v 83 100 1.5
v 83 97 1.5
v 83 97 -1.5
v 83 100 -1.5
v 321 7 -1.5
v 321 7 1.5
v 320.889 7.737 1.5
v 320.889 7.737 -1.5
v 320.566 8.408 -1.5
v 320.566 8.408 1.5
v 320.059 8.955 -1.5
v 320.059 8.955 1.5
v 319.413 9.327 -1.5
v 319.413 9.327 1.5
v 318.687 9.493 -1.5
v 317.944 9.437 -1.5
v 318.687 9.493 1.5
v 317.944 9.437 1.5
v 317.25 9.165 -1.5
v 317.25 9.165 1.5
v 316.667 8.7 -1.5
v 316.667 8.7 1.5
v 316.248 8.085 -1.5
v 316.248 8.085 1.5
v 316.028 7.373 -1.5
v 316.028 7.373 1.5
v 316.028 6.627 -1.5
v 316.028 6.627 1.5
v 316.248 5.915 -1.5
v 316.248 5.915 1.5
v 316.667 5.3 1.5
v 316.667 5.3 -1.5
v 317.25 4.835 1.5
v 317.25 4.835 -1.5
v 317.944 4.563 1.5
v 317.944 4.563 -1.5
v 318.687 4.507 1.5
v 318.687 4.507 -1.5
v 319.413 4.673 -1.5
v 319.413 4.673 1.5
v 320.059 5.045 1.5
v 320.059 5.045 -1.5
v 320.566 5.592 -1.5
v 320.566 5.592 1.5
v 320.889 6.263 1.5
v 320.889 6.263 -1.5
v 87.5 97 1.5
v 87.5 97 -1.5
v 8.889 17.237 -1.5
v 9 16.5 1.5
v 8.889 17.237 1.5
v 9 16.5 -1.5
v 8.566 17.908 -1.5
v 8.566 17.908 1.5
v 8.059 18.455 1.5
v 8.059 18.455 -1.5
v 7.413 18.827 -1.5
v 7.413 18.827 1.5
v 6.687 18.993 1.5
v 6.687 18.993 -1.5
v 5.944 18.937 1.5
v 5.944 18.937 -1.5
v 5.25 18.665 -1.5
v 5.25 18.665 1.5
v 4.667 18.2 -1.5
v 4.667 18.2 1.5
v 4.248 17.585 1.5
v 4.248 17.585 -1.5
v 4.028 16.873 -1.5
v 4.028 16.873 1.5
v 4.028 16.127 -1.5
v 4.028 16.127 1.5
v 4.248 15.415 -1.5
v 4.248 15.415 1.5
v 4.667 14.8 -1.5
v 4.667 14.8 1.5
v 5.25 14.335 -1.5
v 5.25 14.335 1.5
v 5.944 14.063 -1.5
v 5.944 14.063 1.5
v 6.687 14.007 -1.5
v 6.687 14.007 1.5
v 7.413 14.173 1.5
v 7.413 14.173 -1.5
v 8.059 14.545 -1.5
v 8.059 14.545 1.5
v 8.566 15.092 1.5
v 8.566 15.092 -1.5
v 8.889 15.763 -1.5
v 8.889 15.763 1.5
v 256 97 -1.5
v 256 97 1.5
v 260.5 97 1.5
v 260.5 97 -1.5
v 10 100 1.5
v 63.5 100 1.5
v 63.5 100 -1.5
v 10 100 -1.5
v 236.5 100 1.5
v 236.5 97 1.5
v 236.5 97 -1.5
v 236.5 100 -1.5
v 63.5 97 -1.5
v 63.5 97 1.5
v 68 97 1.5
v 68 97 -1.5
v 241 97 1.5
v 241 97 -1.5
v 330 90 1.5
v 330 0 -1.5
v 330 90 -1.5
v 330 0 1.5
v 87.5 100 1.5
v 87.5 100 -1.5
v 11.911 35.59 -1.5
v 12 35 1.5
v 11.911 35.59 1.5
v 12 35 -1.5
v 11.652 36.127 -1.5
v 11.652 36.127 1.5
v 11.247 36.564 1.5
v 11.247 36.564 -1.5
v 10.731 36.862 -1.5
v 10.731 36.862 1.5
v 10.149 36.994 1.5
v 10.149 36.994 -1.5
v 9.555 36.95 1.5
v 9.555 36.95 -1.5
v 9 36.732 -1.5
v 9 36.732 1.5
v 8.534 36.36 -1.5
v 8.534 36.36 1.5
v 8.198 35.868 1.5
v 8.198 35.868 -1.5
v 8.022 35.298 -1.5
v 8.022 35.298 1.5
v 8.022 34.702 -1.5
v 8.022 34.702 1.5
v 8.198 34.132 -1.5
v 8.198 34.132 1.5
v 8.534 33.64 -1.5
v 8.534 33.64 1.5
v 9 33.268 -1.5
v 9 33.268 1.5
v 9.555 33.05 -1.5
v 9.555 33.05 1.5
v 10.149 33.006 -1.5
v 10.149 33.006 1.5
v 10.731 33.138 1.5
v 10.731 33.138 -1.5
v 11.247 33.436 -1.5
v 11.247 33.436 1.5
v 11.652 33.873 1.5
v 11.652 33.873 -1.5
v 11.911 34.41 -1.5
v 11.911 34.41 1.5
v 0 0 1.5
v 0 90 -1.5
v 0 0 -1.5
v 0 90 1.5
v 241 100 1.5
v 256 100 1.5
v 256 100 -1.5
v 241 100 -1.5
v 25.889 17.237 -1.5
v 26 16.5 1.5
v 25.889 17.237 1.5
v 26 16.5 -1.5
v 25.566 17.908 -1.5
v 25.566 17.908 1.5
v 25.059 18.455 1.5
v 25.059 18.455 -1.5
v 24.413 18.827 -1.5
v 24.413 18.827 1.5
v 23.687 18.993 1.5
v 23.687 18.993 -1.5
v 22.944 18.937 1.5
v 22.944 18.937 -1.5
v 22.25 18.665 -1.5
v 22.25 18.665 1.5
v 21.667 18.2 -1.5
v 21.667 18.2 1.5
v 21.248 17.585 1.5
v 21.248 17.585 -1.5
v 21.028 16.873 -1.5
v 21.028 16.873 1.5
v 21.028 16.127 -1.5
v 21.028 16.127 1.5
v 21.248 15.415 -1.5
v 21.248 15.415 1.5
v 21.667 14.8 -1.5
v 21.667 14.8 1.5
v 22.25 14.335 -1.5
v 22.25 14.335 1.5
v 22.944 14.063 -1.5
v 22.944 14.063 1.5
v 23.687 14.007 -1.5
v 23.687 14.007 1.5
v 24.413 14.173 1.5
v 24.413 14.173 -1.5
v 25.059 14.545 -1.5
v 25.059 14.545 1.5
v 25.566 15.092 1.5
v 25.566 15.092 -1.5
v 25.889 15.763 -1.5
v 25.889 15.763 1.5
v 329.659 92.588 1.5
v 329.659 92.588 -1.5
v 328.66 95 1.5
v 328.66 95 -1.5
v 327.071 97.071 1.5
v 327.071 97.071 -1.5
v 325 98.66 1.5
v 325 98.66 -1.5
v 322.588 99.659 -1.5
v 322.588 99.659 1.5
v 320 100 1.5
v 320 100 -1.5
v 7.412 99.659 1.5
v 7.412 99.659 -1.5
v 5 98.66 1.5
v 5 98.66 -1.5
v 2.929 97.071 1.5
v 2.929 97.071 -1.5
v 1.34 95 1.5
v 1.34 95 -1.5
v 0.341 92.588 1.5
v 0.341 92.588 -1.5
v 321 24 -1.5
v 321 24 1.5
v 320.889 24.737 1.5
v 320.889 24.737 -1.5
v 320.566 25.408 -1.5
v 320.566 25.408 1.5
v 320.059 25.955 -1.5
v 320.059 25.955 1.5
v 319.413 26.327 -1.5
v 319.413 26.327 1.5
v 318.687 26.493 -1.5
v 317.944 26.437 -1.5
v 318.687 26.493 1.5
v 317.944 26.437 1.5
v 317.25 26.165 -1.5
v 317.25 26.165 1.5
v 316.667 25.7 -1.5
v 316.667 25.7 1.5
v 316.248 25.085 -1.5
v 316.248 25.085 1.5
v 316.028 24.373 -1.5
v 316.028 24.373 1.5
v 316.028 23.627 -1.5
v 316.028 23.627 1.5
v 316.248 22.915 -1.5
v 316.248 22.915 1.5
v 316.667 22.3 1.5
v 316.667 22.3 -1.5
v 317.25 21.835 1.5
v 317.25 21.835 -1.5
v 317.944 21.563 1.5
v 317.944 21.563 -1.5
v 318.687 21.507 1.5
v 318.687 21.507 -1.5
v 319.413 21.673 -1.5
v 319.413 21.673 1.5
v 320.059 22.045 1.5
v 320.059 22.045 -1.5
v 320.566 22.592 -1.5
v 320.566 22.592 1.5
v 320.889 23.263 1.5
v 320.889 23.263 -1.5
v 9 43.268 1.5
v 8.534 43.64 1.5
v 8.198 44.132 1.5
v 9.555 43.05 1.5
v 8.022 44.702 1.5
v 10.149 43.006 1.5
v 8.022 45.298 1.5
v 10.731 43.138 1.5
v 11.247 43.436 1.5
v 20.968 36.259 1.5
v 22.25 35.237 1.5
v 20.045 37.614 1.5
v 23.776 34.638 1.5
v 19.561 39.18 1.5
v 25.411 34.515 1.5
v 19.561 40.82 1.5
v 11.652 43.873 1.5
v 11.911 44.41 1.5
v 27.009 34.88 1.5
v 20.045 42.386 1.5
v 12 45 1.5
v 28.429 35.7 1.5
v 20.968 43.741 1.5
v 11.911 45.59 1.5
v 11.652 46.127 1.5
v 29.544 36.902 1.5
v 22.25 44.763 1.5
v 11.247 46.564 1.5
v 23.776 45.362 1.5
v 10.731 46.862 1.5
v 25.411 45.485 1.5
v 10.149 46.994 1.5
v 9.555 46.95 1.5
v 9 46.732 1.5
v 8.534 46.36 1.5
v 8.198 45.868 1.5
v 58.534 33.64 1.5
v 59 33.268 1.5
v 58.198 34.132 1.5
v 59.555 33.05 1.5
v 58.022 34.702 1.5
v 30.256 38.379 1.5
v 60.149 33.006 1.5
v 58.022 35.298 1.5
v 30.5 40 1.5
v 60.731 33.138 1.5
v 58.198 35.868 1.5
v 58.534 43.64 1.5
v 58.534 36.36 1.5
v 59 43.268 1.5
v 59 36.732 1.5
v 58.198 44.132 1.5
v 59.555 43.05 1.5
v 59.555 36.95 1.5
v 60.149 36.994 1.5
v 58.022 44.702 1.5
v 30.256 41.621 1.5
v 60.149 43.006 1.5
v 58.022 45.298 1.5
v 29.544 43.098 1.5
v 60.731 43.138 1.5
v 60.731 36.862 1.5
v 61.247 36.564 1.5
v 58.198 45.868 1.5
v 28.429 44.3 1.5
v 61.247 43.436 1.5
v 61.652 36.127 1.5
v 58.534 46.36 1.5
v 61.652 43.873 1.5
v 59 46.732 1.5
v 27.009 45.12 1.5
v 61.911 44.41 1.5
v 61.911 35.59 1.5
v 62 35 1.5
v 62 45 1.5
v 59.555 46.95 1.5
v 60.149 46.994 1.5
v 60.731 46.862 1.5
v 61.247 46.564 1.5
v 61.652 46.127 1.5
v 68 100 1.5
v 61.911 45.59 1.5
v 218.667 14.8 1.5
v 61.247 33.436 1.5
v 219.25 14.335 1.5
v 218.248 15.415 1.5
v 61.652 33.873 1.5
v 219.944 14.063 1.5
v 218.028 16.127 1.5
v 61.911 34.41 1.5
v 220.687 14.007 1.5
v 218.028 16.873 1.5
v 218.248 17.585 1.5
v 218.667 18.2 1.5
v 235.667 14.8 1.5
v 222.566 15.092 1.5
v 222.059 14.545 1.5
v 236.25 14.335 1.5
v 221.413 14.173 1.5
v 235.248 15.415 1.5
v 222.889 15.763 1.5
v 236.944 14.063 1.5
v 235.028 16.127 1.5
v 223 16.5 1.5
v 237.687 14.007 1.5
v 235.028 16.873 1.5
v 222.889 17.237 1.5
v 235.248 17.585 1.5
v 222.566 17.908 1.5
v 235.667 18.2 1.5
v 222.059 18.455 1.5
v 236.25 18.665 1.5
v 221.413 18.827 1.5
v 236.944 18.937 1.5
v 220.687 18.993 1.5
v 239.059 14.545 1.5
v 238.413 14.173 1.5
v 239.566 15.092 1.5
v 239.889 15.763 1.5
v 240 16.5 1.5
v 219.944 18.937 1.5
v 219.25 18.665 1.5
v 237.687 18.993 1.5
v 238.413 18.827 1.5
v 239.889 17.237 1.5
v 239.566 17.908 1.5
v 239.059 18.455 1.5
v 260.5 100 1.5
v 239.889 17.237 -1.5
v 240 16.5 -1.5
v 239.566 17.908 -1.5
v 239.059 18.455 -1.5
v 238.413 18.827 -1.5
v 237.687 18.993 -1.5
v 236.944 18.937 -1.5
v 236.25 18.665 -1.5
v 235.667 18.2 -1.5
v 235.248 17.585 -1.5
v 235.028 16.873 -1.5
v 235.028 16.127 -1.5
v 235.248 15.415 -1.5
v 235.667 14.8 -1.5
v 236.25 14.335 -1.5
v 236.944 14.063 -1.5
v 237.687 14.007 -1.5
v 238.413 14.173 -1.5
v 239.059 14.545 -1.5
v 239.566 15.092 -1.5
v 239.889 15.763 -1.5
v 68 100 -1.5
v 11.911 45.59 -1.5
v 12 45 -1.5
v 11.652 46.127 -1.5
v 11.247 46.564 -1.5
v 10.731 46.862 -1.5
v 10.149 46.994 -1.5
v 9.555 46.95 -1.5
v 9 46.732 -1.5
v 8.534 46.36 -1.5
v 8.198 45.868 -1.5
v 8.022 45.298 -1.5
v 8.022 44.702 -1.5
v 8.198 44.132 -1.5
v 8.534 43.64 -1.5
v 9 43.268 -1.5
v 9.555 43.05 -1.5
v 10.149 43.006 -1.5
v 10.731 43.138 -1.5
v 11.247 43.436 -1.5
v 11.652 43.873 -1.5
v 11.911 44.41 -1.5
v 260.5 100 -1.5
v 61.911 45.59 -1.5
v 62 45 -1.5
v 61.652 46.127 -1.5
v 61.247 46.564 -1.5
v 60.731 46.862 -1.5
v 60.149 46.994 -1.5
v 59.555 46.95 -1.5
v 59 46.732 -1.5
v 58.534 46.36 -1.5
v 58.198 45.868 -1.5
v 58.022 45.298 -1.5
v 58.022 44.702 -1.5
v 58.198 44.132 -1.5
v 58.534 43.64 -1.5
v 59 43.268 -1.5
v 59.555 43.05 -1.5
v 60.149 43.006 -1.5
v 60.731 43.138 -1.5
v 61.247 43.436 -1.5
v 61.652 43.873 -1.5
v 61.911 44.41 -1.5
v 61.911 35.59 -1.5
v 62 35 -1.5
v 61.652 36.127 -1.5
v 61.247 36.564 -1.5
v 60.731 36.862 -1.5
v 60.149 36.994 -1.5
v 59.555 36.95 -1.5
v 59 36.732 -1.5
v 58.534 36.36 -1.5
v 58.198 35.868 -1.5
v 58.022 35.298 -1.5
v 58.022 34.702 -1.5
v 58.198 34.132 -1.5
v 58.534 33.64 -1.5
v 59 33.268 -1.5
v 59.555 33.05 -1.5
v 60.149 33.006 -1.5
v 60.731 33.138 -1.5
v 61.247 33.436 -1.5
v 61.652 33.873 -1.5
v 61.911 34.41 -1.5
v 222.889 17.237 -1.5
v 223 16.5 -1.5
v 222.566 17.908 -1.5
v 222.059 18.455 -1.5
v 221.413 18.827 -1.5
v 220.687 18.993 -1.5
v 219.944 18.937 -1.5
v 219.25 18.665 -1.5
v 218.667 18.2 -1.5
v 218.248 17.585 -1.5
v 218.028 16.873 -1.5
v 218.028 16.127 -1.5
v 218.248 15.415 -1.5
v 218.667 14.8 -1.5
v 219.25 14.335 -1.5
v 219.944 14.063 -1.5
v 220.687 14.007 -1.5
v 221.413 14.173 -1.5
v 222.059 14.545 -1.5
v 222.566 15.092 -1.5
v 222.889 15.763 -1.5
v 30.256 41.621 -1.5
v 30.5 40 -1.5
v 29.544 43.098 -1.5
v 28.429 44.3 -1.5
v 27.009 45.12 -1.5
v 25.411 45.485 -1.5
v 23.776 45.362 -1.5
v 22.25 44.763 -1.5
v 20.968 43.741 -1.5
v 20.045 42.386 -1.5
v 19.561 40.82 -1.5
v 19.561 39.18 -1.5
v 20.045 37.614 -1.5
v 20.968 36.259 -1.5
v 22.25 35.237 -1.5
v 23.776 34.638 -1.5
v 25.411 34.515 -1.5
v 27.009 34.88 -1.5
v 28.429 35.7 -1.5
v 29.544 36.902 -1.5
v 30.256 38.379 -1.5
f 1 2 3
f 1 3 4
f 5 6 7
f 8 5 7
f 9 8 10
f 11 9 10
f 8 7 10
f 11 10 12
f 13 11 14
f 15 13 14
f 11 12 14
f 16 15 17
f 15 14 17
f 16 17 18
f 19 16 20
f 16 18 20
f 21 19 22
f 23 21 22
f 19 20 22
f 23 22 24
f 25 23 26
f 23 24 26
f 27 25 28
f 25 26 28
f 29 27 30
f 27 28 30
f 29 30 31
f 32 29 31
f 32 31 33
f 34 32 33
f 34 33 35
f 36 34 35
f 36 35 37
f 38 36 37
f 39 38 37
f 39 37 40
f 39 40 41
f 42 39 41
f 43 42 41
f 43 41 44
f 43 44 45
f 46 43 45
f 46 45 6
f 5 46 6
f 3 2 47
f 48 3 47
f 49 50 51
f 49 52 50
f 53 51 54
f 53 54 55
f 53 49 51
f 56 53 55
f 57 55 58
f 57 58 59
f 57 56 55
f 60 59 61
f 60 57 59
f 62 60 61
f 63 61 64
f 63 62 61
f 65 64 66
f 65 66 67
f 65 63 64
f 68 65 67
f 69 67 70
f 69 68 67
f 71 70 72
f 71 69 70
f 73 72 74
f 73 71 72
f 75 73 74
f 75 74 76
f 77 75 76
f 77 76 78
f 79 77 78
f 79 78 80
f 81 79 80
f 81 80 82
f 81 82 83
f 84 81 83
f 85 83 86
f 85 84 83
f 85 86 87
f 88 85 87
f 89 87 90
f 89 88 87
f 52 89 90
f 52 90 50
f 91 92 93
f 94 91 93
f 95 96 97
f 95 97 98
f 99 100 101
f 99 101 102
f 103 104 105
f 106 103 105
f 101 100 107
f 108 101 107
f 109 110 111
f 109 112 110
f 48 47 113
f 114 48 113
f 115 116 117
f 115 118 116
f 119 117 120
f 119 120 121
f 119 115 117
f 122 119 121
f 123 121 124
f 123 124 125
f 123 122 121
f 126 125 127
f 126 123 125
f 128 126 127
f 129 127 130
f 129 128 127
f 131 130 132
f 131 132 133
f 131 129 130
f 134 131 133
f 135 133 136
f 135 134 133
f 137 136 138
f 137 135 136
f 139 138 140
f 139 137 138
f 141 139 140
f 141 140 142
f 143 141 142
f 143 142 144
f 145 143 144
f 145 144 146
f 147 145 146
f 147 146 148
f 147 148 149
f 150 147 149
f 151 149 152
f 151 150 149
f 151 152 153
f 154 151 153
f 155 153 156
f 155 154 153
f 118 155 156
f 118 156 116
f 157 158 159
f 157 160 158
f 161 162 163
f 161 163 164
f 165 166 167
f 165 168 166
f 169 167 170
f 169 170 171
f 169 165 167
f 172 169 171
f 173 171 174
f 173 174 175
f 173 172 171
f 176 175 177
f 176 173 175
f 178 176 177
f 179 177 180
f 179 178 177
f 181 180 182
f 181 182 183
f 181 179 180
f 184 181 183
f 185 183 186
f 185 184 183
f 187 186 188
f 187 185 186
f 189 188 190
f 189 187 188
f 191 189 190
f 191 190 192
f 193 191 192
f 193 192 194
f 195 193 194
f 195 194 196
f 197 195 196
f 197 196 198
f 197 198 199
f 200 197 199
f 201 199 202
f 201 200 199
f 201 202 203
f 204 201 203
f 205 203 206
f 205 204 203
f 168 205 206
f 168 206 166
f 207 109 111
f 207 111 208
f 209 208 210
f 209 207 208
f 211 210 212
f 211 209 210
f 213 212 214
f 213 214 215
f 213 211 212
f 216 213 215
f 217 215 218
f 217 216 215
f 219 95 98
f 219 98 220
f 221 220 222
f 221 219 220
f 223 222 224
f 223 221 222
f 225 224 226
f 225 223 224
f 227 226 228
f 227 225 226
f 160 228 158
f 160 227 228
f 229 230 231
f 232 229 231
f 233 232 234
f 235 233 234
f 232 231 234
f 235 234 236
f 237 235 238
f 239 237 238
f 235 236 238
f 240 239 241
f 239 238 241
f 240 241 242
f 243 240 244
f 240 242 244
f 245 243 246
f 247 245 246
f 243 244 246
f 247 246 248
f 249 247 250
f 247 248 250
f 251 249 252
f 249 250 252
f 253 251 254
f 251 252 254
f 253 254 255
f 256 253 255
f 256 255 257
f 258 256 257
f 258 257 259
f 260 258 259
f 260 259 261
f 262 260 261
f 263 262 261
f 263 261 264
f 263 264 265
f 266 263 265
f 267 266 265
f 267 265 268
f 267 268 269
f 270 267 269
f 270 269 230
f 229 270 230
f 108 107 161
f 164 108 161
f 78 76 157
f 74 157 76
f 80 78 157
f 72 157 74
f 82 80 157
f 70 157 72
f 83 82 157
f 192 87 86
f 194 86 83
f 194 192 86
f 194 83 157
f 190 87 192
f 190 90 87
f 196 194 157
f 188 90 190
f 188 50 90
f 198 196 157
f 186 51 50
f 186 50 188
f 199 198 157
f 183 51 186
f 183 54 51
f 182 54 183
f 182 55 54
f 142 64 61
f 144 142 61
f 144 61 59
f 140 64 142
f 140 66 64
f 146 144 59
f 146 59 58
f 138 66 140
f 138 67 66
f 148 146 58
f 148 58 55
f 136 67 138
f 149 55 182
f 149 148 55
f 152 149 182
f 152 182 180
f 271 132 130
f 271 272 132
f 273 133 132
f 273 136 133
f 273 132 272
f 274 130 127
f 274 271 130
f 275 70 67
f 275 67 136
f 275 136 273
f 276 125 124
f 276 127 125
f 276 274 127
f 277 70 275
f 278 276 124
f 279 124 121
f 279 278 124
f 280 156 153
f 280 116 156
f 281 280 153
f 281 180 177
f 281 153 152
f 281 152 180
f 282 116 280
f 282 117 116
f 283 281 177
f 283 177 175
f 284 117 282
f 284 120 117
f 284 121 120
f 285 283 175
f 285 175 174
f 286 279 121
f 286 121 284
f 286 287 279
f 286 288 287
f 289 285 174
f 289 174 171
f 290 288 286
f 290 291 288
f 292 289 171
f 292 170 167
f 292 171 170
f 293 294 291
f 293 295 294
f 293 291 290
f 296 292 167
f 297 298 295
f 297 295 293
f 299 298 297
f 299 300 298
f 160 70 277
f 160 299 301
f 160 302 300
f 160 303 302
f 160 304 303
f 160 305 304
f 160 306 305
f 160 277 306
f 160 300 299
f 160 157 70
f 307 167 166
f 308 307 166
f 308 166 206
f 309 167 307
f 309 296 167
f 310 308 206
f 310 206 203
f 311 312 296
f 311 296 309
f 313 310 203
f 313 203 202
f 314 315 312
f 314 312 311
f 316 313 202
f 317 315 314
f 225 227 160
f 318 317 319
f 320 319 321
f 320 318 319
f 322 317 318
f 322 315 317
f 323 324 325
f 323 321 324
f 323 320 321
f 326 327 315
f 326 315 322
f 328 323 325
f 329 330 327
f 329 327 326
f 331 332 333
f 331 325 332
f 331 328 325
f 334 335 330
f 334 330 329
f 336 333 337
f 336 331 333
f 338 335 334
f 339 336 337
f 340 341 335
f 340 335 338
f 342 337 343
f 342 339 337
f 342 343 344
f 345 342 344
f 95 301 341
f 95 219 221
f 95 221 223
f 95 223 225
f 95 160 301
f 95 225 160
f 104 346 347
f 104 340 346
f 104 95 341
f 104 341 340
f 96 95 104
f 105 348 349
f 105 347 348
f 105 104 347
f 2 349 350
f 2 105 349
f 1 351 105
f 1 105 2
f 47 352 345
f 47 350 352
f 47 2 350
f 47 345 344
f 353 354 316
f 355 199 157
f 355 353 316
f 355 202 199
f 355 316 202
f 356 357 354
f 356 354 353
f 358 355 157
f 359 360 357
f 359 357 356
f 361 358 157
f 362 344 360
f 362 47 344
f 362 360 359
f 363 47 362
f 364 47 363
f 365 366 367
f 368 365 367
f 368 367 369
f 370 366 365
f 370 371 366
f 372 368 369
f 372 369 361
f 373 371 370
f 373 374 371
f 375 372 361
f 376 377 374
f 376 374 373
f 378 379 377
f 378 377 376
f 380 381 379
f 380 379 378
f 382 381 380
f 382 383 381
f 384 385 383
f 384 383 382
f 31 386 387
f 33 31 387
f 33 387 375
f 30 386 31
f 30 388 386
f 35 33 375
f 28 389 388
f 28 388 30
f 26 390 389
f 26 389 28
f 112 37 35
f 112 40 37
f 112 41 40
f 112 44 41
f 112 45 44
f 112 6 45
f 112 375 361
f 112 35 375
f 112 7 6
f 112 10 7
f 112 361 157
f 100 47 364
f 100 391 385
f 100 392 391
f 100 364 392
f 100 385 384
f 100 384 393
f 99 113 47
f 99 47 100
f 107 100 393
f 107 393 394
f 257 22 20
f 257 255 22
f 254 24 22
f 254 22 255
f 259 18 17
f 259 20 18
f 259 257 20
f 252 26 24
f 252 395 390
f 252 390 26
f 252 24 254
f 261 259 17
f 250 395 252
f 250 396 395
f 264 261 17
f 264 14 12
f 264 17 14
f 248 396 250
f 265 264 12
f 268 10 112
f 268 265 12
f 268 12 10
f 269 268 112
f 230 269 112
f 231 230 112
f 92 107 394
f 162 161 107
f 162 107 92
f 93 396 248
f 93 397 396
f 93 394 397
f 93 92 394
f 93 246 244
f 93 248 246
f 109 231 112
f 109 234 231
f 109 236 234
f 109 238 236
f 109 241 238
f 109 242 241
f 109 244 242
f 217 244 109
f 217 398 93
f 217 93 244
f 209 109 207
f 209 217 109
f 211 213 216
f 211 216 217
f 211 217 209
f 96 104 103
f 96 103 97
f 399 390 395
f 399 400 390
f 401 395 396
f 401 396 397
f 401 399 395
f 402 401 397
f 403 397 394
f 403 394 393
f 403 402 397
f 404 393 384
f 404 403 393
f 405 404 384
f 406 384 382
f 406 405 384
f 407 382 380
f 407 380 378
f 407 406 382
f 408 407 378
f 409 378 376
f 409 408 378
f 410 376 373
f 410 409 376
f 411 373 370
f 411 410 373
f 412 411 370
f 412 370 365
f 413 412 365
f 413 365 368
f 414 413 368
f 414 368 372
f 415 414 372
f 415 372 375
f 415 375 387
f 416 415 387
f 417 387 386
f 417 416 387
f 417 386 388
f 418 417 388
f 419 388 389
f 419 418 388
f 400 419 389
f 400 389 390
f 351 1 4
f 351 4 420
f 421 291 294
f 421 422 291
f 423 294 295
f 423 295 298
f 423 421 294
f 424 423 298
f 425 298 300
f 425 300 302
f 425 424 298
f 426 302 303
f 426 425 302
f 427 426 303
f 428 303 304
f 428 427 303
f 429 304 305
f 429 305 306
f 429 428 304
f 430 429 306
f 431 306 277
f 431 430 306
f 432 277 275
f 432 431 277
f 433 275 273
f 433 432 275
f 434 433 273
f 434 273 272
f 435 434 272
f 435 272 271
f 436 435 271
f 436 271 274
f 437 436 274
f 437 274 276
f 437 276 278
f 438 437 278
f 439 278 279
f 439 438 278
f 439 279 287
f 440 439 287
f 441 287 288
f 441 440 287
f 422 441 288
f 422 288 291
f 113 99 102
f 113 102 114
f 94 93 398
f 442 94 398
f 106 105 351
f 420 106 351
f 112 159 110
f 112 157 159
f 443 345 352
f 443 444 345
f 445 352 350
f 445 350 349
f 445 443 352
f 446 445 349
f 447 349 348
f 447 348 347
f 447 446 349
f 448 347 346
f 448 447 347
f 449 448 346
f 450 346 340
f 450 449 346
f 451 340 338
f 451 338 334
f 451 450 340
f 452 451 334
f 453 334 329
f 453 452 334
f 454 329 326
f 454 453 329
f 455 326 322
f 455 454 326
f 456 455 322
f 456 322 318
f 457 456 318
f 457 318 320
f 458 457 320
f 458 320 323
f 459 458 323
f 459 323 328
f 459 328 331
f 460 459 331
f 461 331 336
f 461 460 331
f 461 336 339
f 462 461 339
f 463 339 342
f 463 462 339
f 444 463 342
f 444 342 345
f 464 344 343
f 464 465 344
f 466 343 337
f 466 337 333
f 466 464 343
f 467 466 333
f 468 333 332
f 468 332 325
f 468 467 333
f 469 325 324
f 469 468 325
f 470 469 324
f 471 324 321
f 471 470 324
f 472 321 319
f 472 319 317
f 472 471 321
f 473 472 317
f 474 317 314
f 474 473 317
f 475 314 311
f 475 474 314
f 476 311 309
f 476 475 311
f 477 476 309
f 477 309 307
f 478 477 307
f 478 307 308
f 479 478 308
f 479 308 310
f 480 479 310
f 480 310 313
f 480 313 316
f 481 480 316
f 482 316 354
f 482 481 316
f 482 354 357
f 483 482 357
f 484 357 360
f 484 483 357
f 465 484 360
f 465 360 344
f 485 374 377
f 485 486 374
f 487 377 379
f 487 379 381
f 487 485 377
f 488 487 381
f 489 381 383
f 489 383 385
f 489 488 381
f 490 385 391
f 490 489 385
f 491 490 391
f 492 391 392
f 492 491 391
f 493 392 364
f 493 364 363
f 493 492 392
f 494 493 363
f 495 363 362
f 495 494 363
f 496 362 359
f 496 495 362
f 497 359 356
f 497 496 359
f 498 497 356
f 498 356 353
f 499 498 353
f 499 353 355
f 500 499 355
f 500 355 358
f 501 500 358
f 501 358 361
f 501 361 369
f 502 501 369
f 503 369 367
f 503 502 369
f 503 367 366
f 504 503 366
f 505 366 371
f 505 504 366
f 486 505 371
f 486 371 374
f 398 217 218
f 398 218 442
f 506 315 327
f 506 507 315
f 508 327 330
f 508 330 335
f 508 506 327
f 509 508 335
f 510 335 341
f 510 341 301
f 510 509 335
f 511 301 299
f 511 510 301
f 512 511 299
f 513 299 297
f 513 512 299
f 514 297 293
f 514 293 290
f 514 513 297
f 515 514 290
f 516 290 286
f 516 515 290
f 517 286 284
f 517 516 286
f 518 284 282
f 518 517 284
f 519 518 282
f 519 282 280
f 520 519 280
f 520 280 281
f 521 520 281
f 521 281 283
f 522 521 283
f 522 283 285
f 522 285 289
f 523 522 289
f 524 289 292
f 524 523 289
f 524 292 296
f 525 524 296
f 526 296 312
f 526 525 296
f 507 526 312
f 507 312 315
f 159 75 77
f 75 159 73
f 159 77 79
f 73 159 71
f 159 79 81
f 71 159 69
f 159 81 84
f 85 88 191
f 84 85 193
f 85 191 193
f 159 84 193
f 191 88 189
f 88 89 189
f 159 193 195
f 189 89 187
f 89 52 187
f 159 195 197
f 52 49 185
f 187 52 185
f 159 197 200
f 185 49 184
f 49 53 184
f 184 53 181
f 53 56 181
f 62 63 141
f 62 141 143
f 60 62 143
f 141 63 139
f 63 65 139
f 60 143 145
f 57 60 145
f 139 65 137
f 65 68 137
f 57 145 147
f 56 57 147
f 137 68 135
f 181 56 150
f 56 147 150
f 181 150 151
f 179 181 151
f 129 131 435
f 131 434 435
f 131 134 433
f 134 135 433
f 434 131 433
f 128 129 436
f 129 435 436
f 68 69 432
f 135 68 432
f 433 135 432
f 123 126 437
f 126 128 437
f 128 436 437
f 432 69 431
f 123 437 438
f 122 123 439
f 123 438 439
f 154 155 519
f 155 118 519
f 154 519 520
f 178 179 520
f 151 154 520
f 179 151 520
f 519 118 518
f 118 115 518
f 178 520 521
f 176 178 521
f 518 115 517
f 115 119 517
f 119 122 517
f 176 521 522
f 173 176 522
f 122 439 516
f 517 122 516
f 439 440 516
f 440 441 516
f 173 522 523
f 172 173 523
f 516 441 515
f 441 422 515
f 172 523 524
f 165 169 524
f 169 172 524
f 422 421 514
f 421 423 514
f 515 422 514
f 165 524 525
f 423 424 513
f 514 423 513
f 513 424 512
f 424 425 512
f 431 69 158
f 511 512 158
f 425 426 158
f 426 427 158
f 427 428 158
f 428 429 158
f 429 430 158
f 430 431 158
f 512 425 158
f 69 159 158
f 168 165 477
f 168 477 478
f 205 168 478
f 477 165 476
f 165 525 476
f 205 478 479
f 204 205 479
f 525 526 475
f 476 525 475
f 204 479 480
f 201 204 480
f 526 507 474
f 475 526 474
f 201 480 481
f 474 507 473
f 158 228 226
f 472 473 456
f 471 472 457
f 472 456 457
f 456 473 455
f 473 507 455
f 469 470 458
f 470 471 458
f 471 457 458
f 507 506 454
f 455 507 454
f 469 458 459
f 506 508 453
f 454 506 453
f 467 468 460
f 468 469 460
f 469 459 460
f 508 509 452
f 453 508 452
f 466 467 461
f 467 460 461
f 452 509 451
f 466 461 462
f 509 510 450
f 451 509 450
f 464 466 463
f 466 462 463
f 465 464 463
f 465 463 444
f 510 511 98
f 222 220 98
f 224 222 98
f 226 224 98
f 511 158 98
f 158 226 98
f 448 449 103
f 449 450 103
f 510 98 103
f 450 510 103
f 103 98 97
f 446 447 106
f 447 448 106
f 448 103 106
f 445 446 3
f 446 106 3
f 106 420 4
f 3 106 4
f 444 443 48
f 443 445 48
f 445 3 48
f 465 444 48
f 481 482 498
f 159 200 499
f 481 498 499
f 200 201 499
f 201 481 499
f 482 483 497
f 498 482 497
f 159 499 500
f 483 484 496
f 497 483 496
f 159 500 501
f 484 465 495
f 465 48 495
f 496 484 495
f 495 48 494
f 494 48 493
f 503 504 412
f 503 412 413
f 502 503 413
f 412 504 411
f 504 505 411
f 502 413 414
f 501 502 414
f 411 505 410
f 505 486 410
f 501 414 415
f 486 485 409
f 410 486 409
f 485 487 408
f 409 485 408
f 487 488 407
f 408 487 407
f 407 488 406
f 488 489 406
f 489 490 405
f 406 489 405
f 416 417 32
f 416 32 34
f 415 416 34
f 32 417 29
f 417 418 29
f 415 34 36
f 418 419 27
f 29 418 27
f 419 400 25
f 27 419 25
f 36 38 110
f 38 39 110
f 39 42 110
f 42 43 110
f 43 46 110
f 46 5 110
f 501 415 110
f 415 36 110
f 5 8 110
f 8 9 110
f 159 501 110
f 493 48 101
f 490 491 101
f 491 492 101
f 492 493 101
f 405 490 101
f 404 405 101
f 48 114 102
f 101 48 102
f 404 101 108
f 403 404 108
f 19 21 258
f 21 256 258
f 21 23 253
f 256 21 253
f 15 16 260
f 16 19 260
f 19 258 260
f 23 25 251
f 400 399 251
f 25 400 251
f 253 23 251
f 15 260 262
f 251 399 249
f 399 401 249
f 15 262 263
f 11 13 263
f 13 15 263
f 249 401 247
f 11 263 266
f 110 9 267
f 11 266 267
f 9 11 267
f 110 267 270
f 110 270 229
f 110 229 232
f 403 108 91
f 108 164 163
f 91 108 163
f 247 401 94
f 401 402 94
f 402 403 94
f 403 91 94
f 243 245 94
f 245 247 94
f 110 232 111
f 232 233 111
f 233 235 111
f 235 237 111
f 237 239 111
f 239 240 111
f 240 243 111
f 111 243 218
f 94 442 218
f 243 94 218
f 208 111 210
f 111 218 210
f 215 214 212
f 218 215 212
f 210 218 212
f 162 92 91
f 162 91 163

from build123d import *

# Parameters (mm, degrees)
SKETCH_2_R          = 2
SKETCH_2_R_2        = 5.5
SKETCH_2_R_3        = 2.5
EXTRUDE_1_DEPTH     = 1.5
SKETCH_3_R          = 2.5
CUT_EXTRUDE_1_DEPTH = 10
SKETCH_4_W          = 4.5
SKETCH_4_H          = 3
CUT_EXTRUDE_2_DEPTH = 10
SKETCH_5_W          = 4.5
SKETCH_5_H          = 3
CUT_EXTRUDE_3_DEPTH = 10


with BuildPart() as part:
    # 草图2 → 凸台-拉伸1 (new, symmetric)
    with BuildSketch(Plane.XY):
        with BuildLine():
            Line((120, 0), (207, 0))
            Line((207, 0), (208.99932908, 0))
            Line((208.99932908, 0), (330, 0))
            Line((330, 0), (330, 90))
            ThreePointArc((330, 90), (327.071067812, 97.071067812), (320, 100))
            Line((320, 100), (10, 100))
            ThreePointArc((10, 100), (2.928932188, 97.071067812), (0, 90))
            Line((0, 90), (0, 0))
            Line((0, 0), (30, 0))
            Line((30, 0), (120, 0))
        make_face()
        with Locations((10, 45)):
            Circle(SKETCH_2_R, mode=Mode.SUBTRACT)
        with Locations((10, 35)):
            Circle(SKETCH_2_R, mode=Mode.SUBTRACT)
        with Locations((60, 45)):
            Circle(SKETCH_2_R, mode=Mode.SUBTRACT)
        with Locations((60, 35)):
            Circle(SKETCH_2_R, mode=Mode.SUBTRACT)
        with Locations((25, 40)):
            Circle(SKETCH_2_R_2, mode=Mode.SUBTRACT)
        with Locations((6.5, 16.5)):
            Circle(SKETCH_2_R_3, mode=Mode.SUBTRACT)
        with Locations((23.5, 16.5)):
            Circle(SKETCH_2_R_3, mode=Mode.SUBTRACT)
        with Locations((220.5, 16.5)):
            Circle(SKETCH_2_R_3, mode=Mode.SUBTRACT)
        with Locations((237.5, 16.5)):
            Circle(SKETCH_2_R_3, mode=Mode.SUBTRACT)
    extrude(amount=EXTRUDE_1_DEPTH, both=True)

    # 草图3 → 切除-拉伸1 (cut)
    with BuildSketch(Plane.XY.offset(1.5)):
        with Locations((318.5, 24)):
            Circle(SKETCH_3_R)
        with Locations((318.5, 7)):
            Circle(SKETCH_3_R)
    extrude(amount=-CUT_EXTRUDE_1_DEPTH, mode=Mode.SUBTRACT)

    # 草图4 → 切除-拉伸2 (cut)
    with BuildSketch(Plane.XY.offset(1.5)):
        with Locations((65.75, 98.5)):
            Rectangle(SKETCH_4_W, SKETCH_4_H)
        with Locations((258.25, 98.5)):
            Rectangle(SKETCH_4_W, SKETCH_4_H)
    extrude(amount=-CUT_EXTRUDE_2_DEPTH, mode=Mode.SUBTRACT)

    # 草图5 → 切除-拉伸3 (cut)
    with BuildSketch(Plane.XY.offset(1.5)):
        with Locations((85.25, 98.5)):
            Rectangle(SKETCH_5_W, SKETCH_5_H)
        with Locations((238.75, 98.5)):
            Rectangle(SKETCH_5_W, SKETCH_5_H)
    extrude(amount=-CUT_EXTRUDE_3_DEPTH, mode=Mode.SUBTRACT)


solid = part.part
